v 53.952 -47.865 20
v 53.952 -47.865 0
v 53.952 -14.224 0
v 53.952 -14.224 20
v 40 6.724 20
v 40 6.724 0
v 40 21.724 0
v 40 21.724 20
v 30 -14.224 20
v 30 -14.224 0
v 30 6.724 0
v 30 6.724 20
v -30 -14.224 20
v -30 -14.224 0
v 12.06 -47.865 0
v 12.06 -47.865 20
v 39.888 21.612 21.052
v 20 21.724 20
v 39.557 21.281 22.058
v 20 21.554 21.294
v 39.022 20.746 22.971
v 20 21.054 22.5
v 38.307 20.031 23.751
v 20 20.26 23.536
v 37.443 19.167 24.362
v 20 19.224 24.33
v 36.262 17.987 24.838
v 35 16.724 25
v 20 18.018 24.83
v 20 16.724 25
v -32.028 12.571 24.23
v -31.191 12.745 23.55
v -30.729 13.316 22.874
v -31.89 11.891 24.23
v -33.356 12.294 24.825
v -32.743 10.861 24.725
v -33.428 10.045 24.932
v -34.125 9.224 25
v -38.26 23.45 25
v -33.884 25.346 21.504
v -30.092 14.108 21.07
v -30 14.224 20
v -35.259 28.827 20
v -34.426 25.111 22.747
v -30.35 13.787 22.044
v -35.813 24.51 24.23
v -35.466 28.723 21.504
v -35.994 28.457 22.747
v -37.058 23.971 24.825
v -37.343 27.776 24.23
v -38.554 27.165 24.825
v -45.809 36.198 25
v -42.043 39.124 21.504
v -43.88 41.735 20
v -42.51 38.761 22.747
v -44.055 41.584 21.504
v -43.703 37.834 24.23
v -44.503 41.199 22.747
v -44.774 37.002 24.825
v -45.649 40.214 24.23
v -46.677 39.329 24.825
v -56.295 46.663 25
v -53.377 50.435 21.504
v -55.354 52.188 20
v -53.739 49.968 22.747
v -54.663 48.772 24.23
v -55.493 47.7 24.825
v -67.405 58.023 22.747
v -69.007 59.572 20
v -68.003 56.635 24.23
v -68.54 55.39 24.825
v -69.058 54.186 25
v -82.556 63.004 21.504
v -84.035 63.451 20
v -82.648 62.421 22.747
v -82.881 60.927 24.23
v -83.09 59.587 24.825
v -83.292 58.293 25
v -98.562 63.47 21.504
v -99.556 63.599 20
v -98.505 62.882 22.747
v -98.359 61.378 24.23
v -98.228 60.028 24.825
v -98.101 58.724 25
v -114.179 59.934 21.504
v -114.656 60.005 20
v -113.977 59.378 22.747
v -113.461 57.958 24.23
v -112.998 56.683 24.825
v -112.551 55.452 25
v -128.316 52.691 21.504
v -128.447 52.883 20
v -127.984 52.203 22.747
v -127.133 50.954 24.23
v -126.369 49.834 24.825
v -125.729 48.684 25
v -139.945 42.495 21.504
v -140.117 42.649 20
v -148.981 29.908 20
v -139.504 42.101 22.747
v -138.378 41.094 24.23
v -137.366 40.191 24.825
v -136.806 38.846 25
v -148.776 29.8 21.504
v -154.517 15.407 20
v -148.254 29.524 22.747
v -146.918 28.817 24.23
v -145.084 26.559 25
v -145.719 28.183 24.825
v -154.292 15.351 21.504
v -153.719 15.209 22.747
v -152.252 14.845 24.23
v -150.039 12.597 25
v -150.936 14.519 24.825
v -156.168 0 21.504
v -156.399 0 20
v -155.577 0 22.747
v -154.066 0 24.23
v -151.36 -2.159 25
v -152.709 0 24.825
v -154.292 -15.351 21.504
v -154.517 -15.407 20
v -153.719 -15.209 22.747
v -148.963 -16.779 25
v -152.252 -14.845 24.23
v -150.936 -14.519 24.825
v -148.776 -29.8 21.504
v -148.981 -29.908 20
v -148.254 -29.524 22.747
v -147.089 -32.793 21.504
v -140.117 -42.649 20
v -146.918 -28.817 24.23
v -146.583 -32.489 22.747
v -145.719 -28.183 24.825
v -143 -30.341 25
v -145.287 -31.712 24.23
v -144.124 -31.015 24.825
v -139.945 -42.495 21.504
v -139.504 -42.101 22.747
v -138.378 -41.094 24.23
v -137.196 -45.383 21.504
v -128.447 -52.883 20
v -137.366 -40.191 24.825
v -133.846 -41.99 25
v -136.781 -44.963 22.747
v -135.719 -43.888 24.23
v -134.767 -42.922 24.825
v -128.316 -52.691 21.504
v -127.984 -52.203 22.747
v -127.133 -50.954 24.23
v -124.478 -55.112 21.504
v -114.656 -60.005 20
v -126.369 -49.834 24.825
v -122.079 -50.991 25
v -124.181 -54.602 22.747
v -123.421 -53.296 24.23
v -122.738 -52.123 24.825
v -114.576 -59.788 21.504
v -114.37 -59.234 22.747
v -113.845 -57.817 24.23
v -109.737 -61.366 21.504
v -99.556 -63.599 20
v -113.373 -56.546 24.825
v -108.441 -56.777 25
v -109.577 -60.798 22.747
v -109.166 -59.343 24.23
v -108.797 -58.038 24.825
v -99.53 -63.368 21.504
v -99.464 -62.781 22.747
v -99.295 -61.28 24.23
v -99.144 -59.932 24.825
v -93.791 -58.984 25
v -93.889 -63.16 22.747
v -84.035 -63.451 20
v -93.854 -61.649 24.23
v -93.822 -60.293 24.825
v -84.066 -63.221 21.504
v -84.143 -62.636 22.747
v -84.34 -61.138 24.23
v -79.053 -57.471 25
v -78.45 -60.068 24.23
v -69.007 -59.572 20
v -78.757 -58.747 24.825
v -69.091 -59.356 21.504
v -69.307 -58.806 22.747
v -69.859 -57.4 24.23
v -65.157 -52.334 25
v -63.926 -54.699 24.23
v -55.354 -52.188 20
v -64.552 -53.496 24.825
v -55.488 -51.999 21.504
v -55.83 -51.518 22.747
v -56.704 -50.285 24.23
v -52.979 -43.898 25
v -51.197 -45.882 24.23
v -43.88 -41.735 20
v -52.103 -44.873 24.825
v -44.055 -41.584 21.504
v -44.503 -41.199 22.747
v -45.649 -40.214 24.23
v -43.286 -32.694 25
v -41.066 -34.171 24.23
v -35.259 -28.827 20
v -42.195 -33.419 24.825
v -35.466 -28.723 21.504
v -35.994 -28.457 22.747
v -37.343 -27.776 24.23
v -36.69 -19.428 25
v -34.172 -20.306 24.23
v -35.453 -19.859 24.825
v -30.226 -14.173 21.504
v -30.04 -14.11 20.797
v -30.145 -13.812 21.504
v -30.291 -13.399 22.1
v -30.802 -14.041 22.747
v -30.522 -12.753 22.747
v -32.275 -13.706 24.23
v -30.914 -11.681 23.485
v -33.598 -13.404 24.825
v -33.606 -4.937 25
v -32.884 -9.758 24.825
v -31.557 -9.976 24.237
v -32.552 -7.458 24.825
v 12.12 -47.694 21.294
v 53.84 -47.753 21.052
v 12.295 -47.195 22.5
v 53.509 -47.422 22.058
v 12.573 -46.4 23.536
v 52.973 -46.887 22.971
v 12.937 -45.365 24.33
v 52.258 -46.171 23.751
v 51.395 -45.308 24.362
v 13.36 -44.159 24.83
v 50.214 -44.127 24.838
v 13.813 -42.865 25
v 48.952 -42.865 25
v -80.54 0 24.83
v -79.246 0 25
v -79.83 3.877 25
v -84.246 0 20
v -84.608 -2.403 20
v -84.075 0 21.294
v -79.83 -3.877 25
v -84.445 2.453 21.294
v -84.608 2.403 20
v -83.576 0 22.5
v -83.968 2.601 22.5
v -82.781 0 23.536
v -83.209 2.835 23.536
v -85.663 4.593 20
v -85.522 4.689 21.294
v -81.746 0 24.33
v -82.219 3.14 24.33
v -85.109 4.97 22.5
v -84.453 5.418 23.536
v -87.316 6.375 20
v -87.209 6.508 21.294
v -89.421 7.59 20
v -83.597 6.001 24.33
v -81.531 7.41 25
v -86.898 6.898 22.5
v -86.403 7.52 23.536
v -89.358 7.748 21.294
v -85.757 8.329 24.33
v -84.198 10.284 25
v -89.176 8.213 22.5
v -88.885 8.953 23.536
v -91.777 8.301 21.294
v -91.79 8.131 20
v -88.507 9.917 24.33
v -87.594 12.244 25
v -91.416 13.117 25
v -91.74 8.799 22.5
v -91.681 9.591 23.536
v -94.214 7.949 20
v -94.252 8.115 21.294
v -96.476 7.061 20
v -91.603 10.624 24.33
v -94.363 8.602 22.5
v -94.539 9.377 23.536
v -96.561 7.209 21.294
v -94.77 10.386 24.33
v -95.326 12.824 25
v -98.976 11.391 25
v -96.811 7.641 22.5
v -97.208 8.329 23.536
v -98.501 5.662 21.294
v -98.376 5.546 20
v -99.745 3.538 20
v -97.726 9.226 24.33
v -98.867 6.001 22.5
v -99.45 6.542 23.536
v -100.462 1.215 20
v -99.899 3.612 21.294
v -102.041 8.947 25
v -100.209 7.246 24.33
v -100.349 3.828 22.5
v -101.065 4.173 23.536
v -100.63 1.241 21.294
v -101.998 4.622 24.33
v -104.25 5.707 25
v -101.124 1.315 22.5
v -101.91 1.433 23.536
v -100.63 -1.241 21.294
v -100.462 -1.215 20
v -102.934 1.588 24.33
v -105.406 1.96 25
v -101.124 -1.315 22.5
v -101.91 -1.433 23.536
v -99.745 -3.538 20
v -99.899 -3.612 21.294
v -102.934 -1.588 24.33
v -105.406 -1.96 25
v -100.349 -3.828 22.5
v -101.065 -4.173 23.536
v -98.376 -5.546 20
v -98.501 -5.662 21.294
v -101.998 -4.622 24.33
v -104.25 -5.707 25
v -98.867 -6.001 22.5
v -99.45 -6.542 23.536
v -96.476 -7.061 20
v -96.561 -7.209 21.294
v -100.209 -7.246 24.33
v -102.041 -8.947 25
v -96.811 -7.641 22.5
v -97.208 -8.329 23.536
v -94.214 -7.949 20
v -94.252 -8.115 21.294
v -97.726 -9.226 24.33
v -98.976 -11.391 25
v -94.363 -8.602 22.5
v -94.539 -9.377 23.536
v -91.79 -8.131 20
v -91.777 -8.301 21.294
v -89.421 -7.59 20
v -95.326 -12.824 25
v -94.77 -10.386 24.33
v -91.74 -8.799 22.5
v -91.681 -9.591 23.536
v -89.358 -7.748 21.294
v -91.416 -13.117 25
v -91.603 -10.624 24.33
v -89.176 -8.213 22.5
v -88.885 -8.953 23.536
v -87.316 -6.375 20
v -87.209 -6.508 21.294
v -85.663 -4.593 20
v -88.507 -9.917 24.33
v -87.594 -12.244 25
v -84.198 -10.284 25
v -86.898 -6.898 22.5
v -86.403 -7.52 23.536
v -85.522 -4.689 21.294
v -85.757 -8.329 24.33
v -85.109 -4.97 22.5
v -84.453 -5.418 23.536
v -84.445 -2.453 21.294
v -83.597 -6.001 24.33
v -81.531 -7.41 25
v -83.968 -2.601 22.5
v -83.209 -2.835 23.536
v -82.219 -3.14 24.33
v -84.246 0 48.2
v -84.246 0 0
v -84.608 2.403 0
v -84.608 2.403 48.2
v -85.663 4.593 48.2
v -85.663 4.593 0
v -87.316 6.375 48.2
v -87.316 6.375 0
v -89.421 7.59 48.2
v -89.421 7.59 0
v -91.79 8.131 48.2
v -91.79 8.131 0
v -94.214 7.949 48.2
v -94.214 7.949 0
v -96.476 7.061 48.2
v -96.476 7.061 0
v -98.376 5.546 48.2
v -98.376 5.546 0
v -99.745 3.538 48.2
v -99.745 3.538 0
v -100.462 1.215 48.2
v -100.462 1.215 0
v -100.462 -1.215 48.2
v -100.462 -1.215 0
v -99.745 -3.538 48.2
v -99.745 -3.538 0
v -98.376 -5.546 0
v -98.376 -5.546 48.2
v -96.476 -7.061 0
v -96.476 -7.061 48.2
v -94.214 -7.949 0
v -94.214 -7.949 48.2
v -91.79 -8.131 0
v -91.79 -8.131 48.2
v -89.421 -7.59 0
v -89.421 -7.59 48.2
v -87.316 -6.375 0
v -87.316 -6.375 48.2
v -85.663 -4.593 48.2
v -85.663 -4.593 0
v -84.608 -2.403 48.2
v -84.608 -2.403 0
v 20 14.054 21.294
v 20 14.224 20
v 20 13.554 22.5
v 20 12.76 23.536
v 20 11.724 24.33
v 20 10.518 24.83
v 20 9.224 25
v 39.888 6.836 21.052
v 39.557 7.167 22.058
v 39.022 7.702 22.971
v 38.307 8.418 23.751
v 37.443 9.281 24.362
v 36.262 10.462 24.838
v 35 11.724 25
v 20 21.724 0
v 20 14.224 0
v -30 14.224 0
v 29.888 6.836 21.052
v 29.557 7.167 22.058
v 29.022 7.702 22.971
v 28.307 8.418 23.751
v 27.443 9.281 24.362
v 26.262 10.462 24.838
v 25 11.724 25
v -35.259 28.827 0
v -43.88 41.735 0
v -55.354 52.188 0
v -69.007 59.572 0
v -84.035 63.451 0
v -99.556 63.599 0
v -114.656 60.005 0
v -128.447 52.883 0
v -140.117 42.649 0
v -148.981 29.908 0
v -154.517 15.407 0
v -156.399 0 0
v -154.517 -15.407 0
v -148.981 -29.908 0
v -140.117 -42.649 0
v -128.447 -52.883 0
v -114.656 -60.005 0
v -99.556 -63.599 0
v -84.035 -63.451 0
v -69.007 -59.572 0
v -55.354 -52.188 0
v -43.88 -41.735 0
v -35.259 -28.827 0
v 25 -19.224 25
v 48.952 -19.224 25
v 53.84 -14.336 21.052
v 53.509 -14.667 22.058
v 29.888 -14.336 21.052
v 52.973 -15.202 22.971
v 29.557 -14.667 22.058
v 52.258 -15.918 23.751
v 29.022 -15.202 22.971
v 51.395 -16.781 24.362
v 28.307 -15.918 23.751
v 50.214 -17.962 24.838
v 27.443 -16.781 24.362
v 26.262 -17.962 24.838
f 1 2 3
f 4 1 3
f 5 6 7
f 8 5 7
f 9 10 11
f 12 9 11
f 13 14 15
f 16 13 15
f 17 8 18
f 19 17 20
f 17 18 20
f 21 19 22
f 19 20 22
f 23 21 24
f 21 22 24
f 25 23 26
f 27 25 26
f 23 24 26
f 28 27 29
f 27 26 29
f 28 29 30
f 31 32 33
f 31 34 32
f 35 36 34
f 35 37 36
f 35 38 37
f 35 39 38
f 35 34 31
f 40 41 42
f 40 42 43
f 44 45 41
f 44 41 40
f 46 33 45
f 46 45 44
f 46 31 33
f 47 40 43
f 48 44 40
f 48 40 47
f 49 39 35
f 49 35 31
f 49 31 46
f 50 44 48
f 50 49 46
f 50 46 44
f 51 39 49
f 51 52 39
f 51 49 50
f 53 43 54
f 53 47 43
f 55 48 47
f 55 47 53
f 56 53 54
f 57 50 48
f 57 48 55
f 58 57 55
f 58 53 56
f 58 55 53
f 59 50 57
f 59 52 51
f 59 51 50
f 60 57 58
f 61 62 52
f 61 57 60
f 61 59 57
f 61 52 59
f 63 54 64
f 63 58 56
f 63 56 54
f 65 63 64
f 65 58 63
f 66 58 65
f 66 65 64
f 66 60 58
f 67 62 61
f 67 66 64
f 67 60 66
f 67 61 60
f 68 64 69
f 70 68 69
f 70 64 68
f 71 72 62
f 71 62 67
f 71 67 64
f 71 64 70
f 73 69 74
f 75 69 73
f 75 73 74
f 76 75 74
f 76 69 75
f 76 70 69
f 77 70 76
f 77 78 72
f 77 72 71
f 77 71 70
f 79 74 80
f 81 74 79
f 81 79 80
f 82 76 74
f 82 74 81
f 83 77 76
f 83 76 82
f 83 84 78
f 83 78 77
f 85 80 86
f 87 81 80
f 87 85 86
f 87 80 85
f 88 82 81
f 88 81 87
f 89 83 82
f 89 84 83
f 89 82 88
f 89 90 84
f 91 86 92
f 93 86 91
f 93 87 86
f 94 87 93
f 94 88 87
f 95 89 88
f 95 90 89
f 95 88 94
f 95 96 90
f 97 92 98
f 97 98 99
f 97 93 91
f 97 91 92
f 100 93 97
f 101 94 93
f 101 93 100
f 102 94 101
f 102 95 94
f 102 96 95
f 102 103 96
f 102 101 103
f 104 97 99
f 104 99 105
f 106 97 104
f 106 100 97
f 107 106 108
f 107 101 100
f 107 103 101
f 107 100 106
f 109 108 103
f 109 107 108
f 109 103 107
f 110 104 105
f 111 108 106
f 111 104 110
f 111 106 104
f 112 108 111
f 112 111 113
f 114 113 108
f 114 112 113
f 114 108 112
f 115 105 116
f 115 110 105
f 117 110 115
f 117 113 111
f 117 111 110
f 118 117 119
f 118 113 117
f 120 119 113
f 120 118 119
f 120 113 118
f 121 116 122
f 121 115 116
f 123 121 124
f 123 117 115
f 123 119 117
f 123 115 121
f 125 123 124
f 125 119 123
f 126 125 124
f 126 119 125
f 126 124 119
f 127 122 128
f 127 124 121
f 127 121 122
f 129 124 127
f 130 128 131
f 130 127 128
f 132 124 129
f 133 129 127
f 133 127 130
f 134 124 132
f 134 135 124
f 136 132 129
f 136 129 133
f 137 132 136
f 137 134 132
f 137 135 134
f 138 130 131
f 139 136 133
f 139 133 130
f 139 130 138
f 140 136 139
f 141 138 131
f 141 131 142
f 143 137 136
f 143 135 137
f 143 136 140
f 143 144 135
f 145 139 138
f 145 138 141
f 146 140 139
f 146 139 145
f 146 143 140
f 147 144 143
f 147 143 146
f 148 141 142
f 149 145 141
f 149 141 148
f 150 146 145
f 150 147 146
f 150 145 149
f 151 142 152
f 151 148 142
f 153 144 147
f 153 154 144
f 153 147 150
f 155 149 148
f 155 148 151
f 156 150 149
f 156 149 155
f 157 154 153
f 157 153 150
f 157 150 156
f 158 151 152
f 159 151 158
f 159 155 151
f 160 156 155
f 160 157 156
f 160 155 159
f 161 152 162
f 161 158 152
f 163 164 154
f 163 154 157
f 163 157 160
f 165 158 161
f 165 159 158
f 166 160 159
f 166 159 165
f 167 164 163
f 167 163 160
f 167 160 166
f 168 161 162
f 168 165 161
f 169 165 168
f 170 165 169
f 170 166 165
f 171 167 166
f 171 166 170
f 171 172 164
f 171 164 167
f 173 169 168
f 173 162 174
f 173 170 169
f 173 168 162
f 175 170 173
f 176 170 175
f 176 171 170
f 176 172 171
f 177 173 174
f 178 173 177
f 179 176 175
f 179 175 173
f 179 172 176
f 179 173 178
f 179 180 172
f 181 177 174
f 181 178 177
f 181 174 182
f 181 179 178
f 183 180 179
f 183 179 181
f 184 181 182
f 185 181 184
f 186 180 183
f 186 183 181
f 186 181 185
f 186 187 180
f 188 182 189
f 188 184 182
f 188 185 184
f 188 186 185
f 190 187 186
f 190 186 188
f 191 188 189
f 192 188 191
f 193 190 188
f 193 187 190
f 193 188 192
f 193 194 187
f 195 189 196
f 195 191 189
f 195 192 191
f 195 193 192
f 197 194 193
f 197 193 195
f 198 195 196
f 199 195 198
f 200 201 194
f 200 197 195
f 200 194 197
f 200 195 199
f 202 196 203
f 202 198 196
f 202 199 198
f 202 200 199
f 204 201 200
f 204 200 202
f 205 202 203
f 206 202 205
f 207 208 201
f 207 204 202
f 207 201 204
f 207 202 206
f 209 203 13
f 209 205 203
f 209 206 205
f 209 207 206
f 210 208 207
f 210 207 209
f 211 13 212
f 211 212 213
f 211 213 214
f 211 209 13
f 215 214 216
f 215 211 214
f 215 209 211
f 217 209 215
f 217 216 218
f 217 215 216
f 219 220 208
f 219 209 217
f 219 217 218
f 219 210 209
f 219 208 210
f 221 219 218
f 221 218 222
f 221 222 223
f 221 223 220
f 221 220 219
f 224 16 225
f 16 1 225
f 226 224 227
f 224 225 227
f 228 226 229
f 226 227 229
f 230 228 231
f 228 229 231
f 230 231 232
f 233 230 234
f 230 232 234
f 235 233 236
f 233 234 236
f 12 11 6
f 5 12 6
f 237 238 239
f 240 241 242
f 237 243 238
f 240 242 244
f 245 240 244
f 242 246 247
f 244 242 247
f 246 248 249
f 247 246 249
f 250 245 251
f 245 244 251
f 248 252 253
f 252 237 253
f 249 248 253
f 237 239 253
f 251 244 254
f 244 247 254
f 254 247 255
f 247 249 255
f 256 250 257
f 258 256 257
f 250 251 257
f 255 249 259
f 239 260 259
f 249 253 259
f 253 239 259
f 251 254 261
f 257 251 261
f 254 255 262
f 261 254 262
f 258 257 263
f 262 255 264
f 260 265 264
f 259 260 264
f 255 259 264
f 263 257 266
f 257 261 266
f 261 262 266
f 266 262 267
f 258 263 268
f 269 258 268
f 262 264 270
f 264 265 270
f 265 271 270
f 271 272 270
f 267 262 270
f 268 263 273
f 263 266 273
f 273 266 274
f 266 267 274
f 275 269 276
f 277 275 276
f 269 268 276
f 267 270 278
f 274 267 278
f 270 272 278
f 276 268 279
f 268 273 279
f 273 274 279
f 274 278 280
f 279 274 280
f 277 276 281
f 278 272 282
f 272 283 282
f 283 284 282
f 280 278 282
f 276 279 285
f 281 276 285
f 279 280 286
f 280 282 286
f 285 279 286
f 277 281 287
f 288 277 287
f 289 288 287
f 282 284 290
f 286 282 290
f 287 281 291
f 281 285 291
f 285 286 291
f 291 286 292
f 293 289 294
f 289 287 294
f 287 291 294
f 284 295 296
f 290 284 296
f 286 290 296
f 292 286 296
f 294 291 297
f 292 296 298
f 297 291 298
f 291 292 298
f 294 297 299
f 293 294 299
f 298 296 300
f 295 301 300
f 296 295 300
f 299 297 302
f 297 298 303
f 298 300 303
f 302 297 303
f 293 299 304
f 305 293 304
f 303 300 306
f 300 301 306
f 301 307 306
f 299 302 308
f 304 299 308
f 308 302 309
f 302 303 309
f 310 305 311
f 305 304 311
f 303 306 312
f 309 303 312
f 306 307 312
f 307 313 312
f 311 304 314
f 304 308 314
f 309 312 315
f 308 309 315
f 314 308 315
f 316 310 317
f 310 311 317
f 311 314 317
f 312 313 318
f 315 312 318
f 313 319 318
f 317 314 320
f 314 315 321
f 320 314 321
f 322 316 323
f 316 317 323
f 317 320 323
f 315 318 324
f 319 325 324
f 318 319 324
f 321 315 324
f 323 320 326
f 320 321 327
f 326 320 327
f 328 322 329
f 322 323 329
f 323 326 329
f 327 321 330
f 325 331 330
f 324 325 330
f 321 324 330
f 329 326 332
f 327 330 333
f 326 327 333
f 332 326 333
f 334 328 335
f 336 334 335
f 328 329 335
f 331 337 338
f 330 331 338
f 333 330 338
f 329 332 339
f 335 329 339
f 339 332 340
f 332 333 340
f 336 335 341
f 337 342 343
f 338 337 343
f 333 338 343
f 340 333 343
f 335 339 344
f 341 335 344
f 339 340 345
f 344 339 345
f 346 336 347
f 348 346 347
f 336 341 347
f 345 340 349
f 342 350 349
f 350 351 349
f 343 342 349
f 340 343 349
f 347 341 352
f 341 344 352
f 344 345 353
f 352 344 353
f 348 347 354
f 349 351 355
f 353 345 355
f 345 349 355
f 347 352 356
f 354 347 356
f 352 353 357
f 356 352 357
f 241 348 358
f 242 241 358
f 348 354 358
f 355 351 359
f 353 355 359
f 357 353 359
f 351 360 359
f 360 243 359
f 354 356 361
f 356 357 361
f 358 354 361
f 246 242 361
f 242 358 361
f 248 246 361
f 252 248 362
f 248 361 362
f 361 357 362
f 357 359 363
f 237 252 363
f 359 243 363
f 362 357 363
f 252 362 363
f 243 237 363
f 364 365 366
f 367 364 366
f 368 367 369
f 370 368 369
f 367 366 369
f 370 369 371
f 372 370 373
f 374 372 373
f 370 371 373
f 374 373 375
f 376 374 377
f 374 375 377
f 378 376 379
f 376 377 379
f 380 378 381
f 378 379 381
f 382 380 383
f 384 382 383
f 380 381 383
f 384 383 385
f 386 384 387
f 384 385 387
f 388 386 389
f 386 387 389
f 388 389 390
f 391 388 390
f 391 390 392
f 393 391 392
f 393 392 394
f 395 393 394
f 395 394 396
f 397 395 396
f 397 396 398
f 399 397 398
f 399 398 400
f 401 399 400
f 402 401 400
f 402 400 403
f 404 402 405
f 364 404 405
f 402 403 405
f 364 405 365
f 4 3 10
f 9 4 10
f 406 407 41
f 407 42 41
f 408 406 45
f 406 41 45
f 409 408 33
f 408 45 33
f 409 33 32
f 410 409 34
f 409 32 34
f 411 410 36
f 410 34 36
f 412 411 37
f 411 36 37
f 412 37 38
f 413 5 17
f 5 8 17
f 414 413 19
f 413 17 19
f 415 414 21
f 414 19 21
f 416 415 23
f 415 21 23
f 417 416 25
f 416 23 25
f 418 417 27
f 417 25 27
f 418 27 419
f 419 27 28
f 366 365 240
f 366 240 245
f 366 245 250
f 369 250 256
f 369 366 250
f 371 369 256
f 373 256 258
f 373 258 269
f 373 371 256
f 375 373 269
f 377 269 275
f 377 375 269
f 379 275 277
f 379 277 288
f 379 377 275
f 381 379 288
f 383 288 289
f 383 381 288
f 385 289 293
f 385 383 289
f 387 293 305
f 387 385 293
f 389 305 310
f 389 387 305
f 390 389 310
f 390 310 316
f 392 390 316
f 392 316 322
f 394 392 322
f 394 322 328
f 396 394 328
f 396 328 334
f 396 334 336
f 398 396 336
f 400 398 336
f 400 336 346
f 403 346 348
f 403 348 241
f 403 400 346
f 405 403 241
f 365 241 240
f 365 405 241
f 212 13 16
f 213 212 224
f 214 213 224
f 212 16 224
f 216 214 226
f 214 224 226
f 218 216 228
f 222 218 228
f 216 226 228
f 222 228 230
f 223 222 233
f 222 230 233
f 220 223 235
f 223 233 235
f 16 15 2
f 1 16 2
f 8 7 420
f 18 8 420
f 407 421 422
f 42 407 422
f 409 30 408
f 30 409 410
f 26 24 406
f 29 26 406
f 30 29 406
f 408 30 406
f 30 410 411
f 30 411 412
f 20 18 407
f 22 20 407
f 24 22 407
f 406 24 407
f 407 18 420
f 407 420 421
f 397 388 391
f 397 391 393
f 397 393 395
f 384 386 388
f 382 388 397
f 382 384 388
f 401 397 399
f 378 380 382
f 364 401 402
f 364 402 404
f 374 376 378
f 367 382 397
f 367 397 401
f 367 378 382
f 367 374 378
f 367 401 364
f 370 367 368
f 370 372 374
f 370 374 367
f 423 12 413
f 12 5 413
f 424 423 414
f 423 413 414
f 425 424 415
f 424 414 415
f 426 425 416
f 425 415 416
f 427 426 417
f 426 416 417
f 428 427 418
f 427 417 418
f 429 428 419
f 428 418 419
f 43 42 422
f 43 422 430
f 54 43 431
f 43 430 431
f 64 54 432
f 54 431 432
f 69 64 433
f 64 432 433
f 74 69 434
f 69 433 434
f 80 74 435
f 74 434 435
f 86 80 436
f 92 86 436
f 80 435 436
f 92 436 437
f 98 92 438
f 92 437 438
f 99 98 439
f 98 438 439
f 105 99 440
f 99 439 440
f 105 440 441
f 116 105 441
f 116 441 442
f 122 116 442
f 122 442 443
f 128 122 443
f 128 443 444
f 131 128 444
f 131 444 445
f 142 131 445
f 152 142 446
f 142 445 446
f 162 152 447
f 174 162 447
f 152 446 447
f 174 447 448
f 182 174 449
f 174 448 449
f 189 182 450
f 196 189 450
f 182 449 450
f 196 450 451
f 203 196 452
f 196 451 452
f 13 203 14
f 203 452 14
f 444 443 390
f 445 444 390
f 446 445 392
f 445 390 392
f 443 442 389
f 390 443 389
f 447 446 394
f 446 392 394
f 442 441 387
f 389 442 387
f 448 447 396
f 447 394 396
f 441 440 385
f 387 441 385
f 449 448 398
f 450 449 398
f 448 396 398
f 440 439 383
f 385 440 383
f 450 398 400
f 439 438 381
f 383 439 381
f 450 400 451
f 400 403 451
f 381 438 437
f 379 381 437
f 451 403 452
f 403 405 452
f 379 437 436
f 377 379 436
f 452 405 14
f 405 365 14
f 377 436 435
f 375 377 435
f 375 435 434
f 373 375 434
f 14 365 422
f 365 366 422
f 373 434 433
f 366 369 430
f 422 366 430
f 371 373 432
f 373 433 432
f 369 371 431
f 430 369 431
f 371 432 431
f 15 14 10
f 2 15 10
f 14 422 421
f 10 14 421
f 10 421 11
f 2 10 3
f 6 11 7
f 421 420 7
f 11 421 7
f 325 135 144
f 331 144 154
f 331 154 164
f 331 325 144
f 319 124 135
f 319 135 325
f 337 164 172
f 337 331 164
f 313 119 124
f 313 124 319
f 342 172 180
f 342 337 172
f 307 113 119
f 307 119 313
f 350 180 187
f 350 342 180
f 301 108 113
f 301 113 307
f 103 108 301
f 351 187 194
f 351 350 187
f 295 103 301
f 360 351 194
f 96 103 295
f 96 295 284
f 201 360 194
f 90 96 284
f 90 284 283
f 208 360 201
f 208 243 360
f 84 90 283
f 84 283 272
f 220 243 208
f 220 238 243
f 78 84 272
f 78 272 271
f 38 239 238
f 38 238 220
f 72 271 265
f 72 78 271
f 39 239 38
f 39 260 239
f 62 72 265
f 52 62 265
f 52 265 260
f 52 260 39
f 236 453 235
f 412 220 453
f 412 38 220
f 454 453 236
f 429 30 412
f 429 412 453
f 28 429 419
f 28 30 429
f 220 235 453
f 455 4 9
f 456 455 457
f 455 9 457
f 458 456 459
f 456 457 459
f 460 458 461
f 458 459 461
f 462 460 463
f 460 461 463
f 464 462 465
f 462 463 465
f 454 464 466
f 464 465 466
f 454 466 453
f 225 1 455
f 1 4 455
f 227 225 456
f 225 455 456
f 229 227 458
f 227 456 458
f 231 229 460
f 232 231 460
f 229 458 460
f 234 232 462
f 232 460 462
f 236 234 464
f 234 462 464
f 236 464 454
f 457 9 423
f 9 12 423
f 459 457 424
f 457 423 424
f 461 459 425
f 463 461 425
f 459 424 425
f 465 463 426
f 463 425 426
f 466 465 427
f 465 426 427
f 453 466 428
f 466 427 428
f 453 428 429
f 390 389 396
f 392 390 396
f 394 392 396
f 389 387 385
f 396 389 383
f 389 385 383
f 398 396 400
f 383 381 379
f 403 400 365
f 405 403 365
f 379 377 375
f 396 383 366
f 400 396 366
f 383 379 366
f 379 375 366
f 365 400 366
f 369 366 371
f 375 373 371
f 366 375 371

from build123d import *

# Parameters (mm, degrees)
F0_R     = 8.153451715
F0_W     = 10
F0_H     = 7.5
F1_DEPTH = 25
F2_DEPTH = 48.2
F3_R     = 5


with BuildPart() as f1:
    # F0 (on Top) → F1 (new body)
    with BuildSketch(Plane.XY):
        with BuildLine():
            ThreePointArc((-30, 14.2241413077), (-156.3993093236, 0), (-30, -14.2241413077))
            Line((-30, -14.2241413077), (-30, 14.2241413077))
        make_face()
        with Locations((-92.3993093236, 0)):
            Circle(F0_R, mode=Mode.SUBTRACT)
        Polygon((-30, -14.2241413077), (30, -14.2241413077), (30, 6.7241413077), (20, 6.7241413077), (20, 14.2241413077), (4.5457084796, 14.2241413077), (-30, 14.2241413077), align=None)
        Polygon((53.9515970054, -14.2241413077), (30, -14.2241413077), (-30, -14.2241413077), (12.0598031208, -47.8646345437), (53.9515970054, -47.8646345437), align=None)
        Polygon((30, 14.2241413077), (30, 6.7241413077), (40, 6.7241413077), (40, 21.7241413077), (20, 21.7241413077), (20, 14.2241413077), align=None)
        with Locations((25, 10.4741413077)):
            Rectangle(F0_W, F0_H)
    extrude(amount=F1_DEPTH)

    # F3
    f3_edges = [f1.edges().sort_by_distance(p)[0] for p in [
        (-8.970098, -31.044388, 25),
        (33.0057, -47.864635, 25),
        (41.975799, -14.224141, 25),
        (53.951597, -31.044388, 25),
        (-156.399309, 0, 25),
        (30, -3.75, 25),
        (35, 6.724141, 25),
        (30, 21.724141, 25),
        (40, 14.224141, 25),
        (-5, 14.224141, 25),
        (-100.552761, 0, 25),
    ]]
    fillet(f3_edges, radius=F3_R)


with BuildPart() as f2:
    # F0 (on Top) → F2 (new body)
    with BuildSketch(Plane.XY):
        with Locations((-92.3993093236, 0)):
            Circle(F0_R)
    extrude(amount=F2_DEPTH)


solid = Compound([f1.part, f2.part])
